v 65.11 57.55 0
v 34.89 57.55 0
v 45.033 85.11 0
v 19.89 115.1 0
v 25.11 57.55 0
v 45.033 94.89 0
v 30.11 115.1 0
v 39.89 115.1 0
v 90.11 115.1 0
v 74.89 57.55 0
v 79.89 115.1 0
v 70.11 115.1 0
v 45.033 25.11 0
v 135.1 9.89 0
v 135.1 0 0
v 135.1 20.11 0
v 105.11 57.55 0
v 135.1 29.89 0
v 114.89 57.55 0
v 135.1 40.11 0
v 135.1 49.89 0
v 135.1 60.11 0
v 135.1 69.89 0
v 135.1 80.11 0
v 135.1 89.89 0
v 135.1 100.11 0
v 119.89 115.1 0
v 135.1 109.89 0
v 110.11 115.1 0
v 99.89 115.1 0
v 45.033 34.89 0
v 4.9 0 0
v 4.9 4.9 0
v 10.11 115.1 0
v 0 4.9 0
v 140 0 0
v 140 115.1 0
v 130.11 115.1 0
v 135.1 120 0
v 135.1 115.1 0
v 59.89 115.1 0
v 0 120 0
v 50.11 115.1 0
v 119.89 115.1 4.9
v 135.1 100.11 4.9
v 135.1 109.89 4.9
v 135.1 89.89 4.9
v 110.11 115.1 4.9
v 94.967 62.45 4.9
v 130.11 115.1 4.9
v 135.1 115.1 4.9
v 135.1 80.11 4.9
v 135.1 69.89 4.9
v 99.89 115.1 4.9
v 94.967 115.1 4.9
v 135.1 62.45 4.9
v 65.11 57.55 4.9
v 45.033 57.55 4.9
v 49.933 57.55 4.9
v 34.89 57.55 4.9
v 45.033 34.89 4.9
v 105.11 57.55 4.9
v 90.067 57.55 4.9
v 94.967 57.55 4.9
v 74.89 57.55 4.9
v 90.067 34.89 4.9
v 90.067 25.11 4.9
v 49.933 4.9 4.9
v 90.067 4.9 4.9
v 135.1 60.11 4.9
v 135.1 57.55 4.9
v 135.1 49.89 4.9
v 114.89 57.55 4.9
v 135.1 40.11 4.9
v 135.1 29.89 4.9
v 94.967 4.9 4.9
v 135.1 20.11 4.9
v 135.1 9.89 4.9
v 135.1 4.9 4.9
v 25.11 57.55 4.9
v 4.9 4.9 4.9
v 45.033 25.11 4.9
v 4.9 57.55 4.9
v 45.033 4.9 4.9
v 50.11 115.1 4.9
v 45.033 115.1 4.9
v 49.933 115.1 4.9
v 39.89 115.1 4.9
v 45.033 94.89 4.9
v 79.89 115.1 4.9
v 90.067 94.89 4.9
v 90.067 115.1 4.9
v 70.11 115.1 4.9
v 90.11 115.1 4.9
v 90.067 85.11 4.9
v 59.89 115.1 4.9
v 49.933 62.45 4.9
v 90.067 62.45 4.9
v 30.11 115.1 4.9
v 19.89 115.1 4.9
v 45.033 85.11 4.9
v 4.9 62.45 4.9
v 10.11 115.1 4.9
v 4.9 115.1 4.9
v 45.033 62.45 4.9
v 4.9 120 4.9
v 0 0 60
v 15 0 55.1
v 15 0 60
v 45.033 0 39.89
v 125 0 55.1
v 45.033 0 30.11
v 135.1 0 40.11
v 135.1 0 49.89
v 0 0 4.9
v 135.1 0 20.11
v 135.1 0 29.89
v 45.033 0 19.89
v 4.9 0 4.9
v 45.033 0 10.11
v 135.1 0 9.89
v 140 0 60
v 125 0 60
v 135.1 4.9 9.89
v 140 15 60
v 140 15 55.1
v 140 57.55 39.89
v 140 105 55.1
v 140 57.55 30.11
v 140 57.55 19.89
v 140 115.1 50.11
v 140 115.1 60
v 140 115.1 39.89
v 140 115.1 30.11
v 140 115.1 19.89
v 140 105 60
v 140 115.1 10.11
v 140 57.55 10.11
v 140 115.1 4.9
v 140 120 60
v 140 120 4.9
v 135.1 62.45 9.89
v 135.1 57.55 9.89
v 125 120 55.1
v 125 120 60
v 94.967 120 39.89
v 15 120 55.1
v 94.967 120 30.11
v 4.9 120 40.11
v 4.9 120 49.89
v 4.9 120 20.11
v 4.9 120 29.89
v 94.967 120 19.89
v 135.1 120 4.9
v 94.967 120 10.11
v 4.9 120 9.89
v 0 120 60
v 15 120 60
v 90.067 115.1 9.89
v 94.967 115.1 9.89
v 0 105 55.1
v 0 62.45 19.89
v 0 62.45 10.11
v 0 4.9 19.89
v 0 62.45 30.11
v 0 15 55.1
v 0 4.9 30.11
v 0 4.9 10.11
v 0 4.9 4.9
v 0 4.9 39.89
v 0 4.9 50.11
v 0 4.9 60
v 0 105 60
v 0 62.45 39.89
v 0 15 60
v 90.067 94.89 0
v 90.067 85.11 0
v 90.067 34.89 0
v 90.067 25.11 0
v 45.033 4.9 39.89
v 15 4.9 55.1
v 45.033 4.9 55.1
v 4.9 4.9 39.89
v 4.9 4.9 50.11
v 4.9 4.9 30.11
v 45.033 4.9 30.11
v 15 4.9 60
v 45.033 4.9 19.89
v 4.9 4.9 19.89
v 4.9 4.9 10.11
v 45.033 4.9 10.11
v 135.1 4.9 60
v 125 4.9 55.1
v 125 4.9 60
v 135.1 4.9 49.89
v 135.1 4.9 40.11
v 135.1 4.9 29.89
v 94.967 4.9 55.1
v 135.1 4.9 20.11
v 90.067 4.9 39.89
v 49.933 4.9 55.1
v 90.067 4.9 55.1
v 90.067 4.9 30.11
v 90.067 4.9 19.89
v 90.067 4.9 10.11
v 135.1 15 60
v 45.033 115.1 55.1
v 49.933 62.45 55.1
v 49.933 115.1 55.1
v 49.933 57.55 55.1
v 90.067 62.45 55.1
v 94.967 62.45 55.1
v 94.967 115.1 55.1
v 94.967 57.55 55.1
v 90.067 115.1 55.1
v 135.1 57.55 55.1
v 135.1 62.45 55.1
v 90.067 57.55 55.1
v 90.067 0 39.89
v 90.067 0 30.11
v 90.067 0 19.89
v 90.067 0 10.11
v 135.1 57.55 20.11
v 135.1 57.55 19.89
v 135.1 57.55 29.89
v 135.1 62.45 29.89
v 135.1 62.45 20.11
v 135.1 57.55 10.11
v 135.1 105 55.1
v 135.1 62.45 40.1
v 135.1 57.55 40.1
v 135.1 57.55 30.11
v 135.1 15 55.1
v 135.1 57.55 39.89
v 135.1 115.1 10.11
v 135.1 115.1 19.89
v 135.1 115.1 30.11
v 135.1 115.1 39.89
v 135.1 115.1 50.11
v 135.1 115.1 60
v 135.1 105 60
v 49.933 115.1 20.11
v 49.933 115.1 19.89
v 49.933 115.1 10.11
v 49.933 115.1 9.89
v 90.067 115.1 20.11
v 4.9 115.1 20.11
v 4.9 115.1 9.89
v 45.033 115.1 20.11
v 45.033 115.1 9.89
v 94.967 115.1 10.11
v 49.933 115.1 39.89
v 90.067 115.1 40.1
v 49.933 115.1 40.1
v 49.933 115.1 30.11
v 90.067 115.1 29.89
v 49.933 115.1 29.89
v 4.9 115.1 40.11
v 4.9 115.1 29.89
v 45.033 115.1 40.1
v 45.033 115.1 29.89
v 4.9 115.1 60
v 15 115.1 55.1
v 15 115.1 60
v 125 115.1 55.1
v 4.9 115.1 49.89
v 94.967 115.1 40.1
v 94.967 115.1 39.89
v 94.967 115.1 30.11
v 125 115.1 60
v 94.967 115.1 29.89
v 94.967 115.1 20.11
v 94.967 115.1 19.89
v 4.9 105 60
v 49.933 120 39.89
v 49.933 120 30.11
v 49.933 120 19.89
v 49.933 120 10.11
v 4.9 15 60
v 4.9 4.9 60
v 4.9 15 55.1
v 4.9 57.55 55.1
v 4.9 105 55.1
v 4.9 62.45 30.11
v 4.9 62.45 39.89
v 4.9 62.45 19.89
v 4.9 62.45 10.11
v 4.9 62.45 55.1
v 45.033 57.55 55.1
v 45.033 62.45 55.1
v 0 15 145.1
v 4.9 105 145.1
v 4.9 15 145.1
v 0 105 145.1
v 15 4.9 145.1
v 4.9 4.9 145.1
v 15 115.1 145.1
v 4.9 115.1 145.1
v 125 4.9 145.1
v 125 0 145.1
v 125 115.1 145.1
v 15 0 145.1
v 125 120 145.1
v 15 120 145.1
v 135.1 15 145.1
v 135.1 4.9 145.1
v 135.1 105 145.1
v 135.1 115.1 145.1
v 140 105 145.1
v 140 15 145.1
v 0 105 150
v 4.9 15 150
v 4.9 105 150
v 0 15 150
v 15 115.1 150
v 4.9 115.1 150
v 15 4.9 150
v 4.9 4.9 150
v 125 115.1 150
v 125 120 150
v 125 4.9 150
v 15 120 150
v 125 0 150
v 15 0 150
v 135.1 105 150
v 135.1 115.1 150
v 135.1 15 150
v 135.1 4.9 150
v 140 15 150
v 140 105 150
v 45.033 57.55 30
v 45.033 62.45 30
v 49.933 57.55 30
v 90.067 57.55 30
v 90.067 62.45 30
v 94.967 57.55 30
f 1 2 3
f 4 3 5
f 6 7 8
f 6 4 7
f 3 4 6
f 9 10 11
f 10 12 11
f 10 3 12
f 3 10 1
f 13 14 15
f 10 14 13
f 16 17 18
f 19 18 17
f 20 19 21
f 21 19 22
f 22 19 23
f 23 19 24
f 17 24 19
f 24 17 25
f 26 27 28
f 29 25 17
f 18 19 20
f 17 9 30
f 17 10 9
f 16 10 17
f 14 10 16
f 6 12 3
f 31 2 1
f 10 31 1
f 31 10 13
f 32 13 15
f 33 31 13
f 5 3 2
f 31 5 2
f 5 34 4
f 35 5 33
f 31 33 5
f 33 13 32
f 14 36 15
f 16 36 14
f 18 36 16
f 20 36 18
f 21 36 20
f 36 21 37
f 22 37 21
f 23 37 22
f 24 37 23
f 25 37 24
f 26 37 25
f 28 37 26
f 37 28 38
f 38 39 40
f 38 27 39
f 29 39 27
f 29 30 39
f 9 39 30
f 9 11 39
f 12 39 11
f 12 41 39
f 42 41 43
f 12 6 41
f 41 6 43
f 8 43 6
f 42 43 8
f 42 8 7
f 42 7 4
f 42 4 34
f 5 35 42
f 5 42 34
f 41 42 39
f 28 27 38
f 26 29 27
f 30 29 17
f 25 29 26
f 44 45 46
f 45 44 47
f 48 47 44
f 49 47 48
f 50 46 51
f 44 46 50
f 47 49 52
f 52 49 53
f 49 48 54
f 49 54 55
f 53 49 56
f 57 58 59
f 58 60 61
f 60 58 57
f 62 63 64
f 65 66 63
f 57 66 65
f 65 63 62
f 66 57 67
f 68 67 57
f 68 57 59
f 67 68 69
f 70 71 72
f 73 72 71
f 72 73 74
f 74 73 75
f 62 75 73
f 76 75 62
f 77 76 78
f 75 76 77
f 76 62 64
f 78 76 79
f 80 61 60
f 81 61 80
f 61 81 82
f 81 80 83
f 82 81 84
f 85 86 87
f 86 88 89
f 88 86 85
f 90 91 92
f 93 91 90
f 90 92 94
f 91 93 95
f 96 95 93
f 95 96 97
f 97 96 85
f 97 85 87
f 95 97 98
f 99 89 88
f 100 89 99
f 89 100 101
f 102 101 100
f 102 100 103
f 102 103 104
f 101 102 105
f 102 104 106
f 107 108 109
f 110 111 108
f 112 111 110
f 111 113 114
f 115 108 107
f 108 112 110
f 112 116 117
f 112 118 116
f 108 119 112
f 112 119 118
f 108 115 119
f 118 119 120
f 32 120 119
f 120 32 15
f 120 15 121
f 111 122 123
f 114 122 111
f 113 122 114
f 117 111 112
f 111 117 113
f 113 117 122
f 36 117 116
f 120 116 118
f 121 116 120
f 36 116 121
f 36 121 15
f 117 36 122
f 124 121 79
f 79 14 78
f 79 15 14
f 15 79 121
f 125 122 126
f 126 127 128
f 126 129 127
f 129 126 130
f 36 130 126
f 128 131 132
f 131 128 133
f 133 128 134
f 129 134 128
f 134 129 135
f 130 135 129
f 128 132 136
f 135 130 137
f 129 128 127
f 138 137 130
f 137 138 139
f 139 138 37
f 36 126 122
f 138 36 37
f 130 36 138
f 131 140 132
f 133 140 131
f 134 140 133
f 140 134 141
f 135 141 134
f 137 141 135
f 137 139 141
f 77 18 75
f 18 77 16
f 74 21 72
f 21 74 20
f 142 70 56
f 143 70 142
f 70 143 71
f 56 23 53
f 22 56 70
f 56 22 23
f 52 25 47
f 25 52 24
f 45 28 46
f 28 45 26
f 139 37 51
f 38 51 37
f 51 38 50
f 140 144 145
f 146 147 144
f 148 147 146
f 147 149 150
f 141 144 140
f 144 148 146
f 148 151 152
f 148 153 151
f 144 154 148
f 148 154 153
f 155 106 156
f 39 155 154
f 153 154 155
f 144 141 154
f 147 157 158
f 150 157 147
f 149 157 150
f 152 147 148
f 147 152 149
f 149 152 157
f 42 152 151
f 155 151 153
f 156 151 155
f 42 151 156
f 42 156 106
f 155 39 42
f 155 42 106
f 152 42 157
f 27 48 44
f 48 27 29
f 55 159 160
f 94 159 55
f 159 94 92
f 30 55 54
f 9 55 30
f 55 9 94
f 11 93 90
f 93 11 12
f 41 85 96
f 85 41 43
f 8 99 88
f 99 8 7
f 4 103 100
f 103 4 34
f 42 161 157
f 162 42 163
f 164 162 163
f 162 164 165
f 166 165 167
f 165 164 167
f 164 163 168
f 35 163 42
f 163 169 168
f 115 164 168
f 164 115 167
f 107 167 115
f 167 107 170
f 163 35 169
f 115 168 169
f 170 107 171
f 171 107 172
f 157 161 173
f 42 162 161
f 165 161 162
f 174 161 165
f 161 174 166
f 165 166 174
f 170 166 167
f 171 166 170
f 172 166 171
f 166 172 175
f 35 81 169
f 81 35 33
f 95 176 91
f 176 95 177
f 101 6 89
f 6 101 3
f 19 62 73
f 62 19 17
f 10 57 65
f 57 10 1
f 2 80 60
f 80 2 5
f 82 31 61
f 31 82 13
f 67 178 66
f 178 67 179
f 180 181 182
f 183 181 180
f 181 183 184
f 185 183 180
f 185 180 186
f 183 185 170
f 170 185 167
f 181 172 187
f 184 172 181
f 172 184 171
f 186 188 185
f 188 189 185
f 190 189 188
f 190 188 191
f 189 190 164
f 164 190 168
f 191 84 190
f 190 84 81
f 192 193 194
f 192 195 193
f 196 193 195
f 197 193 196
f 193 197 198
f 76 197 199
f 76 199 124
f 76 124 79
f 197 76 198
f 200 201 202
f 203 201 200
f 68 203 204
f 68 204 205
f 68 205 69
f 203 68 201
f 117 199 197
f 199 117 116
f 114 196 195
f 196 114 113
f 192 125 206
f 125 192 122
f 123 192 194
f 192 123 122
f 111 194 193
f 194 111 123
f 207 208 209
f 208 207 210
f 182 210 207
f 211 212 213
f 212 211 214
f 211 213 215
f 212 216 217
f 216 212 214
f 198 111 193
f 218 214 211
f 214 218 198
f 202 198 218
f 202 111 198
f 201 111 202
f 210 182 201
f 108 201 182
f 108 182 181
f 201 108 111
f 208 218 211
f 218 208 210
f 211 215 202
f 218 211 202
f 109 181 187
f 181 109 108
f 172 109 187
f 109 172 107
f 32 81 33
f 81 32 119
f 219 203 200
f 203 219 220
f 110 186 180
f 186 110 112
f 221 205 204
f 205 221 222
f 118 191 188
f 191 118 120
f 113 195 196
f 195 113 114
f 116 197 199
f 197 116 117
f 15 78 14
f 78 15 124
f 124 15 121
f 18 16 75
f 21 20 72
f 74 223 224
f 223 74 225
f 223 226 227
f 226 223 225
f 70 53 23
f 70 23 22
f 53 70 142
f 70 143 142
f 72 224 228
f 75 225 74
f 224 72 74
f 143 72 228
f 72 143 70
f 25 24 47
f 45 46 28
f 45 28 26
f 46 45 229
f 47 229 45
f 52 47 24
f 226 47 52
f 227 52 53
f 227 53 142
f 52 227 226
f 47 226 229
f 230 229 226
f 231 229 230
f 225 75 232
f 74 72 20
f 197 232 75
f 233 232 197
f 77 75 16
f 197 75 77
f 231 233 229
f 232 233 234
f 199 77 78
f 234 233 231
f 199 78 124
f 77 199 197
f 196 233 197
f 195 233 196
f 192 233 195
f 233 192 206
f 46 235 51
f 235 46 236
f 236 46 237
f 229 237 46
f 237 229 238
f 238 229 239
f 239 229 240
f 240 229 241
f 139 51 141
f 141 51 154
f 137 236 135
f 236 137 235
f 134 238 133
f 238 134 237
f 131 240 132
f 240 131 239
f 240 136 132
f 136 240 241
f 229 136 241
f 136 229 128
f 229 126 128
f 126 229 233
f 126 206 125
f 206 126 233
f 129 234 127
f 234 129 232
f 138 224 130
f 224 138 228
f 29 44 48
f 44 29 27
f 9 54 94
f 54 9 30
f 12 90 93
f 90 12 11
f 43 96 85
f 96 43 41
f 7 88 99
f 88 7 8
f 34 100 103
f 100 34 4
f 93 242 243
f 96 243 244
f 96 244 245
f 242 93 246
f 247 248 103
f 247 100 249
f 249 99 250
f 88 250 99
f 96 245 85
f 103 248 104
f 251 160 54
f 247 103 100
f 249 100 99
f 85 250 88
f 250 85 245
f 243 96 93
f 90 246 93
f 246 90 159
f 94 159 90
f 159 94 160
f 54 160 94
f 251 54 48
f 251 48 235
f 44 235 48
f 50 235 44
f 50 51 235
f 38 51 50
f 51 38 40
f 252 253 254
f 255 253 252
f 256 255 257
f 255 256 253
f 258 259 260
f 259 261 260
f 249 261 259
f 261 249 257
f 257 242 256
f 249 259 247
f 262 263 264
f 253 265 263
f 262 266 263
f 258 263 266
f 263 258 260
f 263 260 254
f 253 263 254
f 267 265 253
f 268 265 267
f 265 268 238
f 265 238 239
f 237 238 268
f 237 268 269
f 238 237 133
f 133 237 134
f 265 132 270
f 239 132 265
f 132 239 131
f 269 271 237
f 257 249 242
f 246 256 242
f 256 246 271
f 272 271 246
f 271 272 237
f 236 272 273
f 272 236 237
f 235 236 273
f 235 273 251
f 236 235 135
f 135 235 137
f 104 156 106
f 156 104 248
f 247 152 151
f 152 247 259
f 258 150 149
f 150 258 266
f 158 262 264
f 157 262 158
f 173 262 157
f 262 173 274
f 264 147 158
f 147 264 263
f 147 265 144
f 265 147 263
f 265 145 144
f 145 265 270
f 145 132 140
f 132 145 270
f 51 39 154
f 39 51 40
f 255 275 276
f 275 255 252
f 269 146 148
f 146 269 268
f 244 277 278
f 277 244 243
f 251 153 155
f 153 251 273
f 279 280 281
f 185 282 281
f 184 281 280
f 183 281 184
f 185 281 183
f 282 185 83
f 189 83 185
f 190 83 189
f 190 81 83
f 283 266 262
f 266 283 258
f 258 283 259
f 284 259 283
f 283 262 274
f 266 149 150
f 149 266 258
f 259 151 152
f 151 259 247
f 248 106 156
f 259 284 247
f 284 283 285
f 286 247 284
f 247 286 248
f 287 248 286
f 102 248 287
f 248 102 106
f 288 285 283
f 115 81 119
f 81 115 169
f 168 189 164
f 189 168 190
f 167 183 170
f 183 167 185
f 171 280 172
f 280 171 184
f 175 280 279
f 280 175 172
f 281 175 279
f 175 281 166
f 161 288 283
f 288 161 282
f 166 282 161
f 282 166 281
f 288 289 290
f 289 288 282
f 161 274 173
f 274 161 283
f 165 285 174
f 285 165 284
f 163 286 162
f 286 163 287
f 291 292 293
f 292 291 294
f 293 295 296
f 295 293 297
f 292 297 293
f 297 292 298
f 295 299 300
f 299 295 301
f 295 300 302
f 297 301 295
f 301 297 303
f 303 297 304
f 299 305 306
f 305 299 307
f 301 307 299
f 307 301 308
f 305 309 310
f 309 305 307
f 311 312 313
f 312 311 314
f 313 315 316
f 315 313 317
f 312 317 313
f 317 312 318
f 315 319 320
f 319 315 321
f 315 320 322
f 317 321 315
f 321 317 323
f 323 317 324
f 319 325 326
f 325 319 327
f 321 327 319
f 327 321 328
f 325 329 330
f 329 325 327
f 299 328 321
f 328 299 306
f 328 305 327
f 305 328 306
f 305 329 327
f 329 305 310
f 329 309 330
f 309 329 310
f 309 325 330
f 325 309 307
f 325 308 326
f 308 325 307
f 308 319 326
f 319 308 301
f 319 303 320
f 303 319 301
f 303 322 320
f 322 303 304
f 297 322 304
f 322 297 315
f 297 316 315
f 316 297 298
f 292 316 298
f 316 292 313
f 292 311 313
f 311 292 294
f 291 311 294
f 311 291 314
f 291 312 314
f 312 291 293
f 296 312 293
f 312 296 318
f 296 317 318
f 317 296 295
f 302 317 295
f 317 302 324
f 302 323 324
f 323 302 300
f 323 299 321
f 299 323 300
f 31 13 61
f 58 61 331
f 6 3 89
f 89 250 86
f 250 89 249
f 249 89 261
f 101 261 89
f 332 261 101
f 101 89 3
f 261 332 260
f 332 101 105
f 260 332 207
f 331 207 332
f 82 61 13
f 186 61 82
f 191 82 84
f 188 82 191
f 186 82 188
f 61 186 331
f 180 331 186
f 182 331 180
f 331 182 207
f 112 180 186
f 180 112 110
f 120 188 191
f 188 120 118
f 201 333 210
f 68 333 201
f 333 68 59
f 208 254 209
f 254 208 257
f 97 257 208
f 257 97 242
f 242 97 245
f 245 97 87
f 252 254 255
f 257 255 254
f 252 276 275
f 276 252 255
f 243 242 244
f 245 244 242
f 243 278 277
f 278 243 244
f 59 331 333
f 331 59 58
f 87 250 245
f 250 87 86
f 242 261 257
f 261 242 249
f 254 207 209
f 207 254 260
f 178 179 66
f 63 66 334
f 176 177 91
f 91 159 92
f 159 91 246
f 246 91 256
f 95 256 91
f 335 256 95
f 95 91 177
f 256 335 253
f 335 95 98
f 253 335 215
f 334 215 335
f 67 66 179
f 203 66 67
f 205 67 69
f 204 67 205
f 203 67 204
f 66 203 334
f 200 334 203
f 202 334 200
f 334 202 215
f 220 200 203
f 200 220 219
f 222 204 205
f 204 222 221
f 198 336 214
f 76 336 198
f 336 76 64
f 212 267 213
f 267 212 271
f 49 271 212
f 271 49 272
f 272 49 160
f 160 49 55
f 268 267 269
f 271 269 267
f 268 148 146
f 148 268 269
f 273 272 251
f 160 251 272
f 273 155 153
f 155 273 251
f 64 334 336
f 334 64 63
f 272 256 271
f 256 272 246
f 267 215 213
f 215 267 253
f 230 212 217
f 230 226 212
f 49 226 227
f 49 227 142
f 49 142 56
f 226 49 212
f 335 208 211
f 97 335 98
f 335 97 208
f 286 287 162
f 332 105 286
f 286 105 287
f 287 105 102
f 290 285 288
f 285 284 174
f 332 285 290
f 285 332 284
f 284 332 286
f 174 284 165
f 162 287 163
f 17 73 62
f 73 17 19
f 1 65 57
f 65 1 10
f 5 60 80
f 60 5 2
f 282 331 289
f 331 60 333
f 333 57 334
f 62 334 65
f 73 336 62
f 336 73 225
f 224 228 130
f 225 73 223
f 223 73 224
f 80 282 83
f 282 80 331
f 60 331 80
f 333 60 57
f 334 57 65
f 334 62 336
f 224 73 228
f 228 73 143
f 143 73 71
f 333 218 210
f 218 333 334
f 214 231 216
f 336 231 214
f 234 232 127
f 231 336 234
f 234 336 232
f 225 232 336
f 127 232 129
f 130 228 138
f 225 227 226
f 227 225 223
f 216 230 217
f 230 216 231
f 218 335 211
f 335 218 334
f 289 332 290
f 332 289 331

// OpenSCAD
union() {
	union() {
		linear_extrude(height = 4.9000000000) {
			union() {
				difference() {
					polygon(points = [[140.0000000000, 89.8900000000], [135.1000000000, 89.8900000000], [135.1000000000, 80.1100000000], [140.0000000000, 80.1100000000], [140.0000000000, 69.8900000000], [135.1000000000, 69.8900000000], [135.1000000000, 60.1100000000], [140.0000000000, 60.1100000000], [140.0000000000, 49.8900000000], [135.1000000000, 49.8900000000], [135.1000000000, 40.1100000000], [140.0000000000, 40.1100000000], [140.0000000000, 29.8900000000], [135.1000000000, 29.8900000000], [135.1000000000, 20.1100000000], [140.0000000000, 20.1100000000], [140.0000000000, 9.8900000000], [135.1000000000, 9.8900000000], [135.1000000000, 0.0000000000], [129.8900000000, 0.0000000000], [129.8900000000, 4.9000000000], [120.1100000000, 4.9000000000], [120.1100000000, 0.0000000000], [109.8900000000, 0.0000000000], [109.8900000000, 4.9000000000], [100.1100000000, 4.9000000000], [100.1100000000, 0.0000000000], [89.8900000000, 0.0000000000], [89.8900000000, 4.9000000000], [80.1100000000, 4.9000000000], [80.1100000000, 0.0000000000], [69.8900000000, 0.0000000000], [69.8900000000, 4.9000000000], [60.1100000000, 4.9000000000], [60.1100000000, 0.0000000000], [49.8900000000, 0.0000000000], [49.8900000000, 4.9000000000], [40.1100000000, 4.9000000000], [40.1100000000, 0.0000000000], [29.8900000000, 0.0000000000], [29.8900000000, 4.9000000000], [20.1100000000, 4.9000000000], [20.1100000000, 0.0000000000], [9.8900000000, 0.0000000000], [9.8900000000, 4.9000000000], [0.0000000000, 4.9000000000], [0.0000000000, 10.1100000000], [4.9000000000, 10.1100000000], [4.9000000000, 19.8900000000], [0.0000000000, 19.8900000000], [0.0000000000, 30.1100000000], [4.9000000000, 30.1100000000], [4.9000000000, 39.8900000000], [0.0000000000, 39.8900000000], [0.0000000000, 50.1100000000], [4.9000000000, 50.1100000000], [4.9000000000, 59.8900000000], [0.0000000000, 59.8900000000], [0.0000000000, 70.1100000000], [4.9000000000, 70.1100000000], [4.9000000000, 79.8900000000], [0.0000000000, 79.8900000000], [0.0000000000, 90.1100000000], [4.9000000000, 90.1100000000], [4.9000000000, 99.8900000000], [0.0000000000, 99.8900000000], [0.0000000000, 110.1100000000], [4.9000000000, 110.1100000000], [4.9000000000, 120.0000000000], [10.1100000000, 120.0000000000], [10.1100000000, 115.1000000000], [19.8900000000, 115.1000000000], [19.8900000000, 120.0000000000], [30.1100000000, 120.0000000000], [30.1100000000, 115.1000000000], [39.8900000000, 115.1000000000], [39.8900000000, 120.0000000000], [50.1100000000, 120.0000000000], [50.1100000000, 115.1000000000], [59.8900000000, 115.1000000000], [59.8900000000, 120.0000000000], [70.1100000000, 120.0000000000], [70.1100000000, 115.1000000000], [79.8900000000, 115.1000000000], [79.8900000000, 120.0000000000], [90.1100000000, 120.0000000000], [90.1100000000, 115.1000000000], [99.8900000000, 115.1000000000], [99.8900000000, 120.0000000000], [110.1100000000, 120.0000000000], [110.1100000000, 115.1000000000], [119.8900000000, 115.1000000000], [119.8900000000, 120.0000000000], [130.1100000000, 120.0000000000], [130.1100000000, 115.1000000000], [140.0000000000, 115.1000000000], [140.0000000000, 109.8900000000], [135.1000000000, 109.8900000000], [135.1000000000, 100.1100000000], [140.0000000000, 100.1100000000], [140.0000000000, 89.8900000000]]);
					polygon(points = [[45.0333333333, 25.1100000000], [49.9333333333, 25.1100000000], [49.9333333333, 34.8900000000], [45.0333333333, 34.8900000000], [45.0333333333, 25.1100000000]]);
					polygon(points = [[45.0333333333, 85.1100000000], [49.9333333333, 85.1100000000], [49.9333333333, 94.8900000000], [45.0333333333, 94.8900000000], [45.0333333333, 85.1100000000]]);
					polygon(points = [[90.0666666667, 34.8900000000], [90.0666666667, 25.1100000000], [94.9666666667, 25.1100000000], [94.9666666667, 34.8900000000], [90.0666666667, 34.8900000000]]);
					polygon(points = [[90.0666666667, 94.8900000000], [90.0666666667, 85.1100000000], [94.9666666667, 85.1100000000], [94.9666666667, 94.8900000000], [90.0666666667, 94.8900000000]]);
					polygon(points = [[34.8900000000, 57.5500000000], [34.8900000000, 62.4500000000], [25.1100000000, 62.4500000000], [25.1100000000, 57.5500000000], [34.8900000000, 57.5500000000]]);
					polygon(points = [[65.1100000000, 57.5500000000], [74.8900000000, 57.5500000000], [74.8900000000, 62.4500000000], [65.1100000000, 62.4500000000], [65.1100000000, 57.5500000000]]);
					polygon(points = [[105.1100000000, 57.5500000000], [114.8900000000, 57.5500000000], [114.8900000000, 62.4500000000], [105.1100000000, 62.4500000000], [105.1100000000, 57.5500000000]]);
				}
			}
		}
	}
	union() {
		color(alpha = 1.0000000000, c = [0.8000000000, 0.5000000000, 0.2000000000]) {
			translate(v = [0, 4.9000000000, 0]) {
				rotate(a = 90, v = [1, 0, 0]) {
					linear_extrude(height = 4.9000000000) {
						union() {
							difference() {
								polygon(points = [[135.1000000000, 40.1100000000], [140.0000000000, 40.1100000000], [140.0000000000, 29.8900000000], [135.1000000000, 29.8900000000], [135.1000000000, 20.1100000000], [140.0000000000, 20.1100000000], [140.0000000000, 9.8900000000], [135.1000000000, 9.8900000000], [135.1000000000, 4.9000000000], [130.1100000000, 4.9000000000], [130.1100000000, 0.0000000000], [119.8900000000, 0.0000000000], [119.8900000000, 4.9000000000], [110.1100000000, 4.9000000000], [110.1100000000, 0.0000000000], [99.8900000000, 0.0000000000], [99.8900000000, 4.9000000000], [90.1100000000, 4.9000000000], [90.1100000000, 0.0000000000], [79.8900000000, 0.0000000000], [79.8900000000, 4.9000000000], [70.1100000000, 4.9000000000], [70.1100000000, 0.0000000000], [59.8900000000, 0.0000000000], [59.8900000000, 4.9000000000], [50.1100000000, 4.9000000000], [50.1100000000, 0.0000000000], [39.8900000000, 0.0000000000], [39.8900000000, 4.9000000000], [30.1100000000, 4.9000000000], [30.1100000000, 0.0000000000], [19.8900000000, 0.0000000000], [19.8900000000, 4.9000000000], [10.1100000000, 4.9000000000], [10.1100000000, 0.0000000000], [4.9000000000, 0.0000000000], [4.9000000000, 9.8900000000], [0.0000000000, 9.8900000000], [0.0000000000, 20.1100000000], [4.9000000000, 20.1100000000], [4.9000000000, 29.8900000000], [0.0000000000, 29.8900000000], [0.0000000000, 40.1100000000], [4.9000000000, 40.1100000000], [4.9000000000, 49.8900000000], [0.0000000000, 49.8900000000], [0.0000000000, 60.0000000000], [15.0000000000, 60.0000000000], [15.0000000000, 55.1000000000], [125.0000000000, 55.1000000000], [125.0000000000, 60.0000000000], [140.0000000000, 60.0000000000], [140.0000000000, 49.8900000000], [135.1000000000, 49.8900000000], [135.1000000000, 40.1100000000]]);
								polygon(points = [[94.9666666667, 30.1100000000], [94.9666666667, 39.8900000000], [90.0666666667, 39.8900000000], [90.0666666667, 30.1100000000], [94.9666666667, 30.1100000000]]);
								polygon(points = [[94.9666666667, 10.1100000000], [94.9666666667, 19.8900000000], [90.0666666667, 19.8900000000], [90.0666666667, 10.1100000000], [94.9666666667, 10.1100000000]]);
								polygon(points = [[45.0333333333, 30.1100000000], [49.9333333333, 30.1100000000], [49.9333333333, 39.8900000000], [45.0333333333, 39.8900000000], [45.0333333333, 30.1100000000]]);
								polygon(points = [[45.0333333333, 10.1100000000], [49.9333333333, 10.1100000000], [49.9333333333, 19.8900000000], [45.0333333333, 19.8900000000], [45.0333333333, 10.1100000000]]);
							}
						}
					}
				}
			}
		}
	}
	union() {
		color(alpha = 1.0000000000, c = [0.7000000000, 0.4000000000, 0.1000000000]) {
			translate(v = [135.1000000000, 0, 0]) {
				rotate(a = 90, v = [0, 0, 1]) {
					rotate(a = 90, v = [1, 0, 0]) {
						linear_extrude(height = 4.9000000000) {
							union() {
								difference() {
									polygon(points = [[120.0000000000, 50.1100000000], [120.0000000000, 39.8900000000], [115.1000000000, 39.8900000000], [115.1000000000, 30.1100000000], [120.0000000000, 30.1100000000], [120.0000000000, 19.8900000000], [115.1000000000, 19.8900000000], [115.1000000000, 10.1100000000], [120.0000000000, 10.1100000000], [120.0000000000, 4.9000000000], [110.1100000000, 4.9000000000], [110.1100000000, 0.0000000000], [99.8900000000, 0.0000000000], [99.8900000000, 4.9000000000], [90.1100000000, 4.9000000000], [90.1100000000, 0.0000000000], [79.8900000000, 0.0000000000], [79.8900000000, 4.9000000000], [70.1100000000, 4.9000000000], [70.1100000000, 0.0000000000], [59.8900000000, 0.0000000000], [59.8900000000, 4.9000000000], [50.1100000000, 4.9000000000], [50.1100000000, 0.0000000000], [39.8900000000, 0.0000000000], [39.8900000000, 4.9000000000], [30.1100000000, 4.9000000000], [30.1100000000, 0.0000000000], [19.8900000000, 0.0000000000], [19.8900000000, 4.9000000000], [10.1100000000, 4.9000000000], [10.1100000000, 0.0000000000], [0.0000000000, 0.0000000000], [0.0000000000, 10.1100000000], [4.9000000000, 10.1100000000], [4.9000000000, 19.8900000000], [0.0000000000, 19.8900000000], [0.0000000000, 30.1100000000], [4.9000000000, 30.1100000000], [4.9000000000, 39.8900000000], [0.0000000000, 39.8900000000], [0.0000000000, 50.1100000000], [4.9000000000, 50.1100000000], [4.9000000000, 60.0000000000], [15.0000000000, 60.0000000000], [15.0000000000, 55.1000000000], [105.0000000000, 55.1000000000], [105.0000000000, 60.0000000000], [115.1000000000, 60.0000000000], [115.1000000000, 50.1100000000], [120.0000000000, 50.1100000000]]);
									polygon(points = [[57.5500000000, 30.1100000000], [62.4500000000, 30.1100000000], [62.4500000000, 39.8900000000], [57.5500000000, 39.8900000000], [57.5500000000, 30.1100000000]]);
									polygon(points = [[57.5500000000, 10.1100000000], [62.4500000000, 10.1100000000], [62.4500000000, 19.8900000000], [57.5500000000, 19.8900000000], [57.5500000000, 10.1100000000]]);
								}
							}
						}
					}
				}
			}
		}
	}
	union() {
		color(alpha = 1.0000000000, c = [0.8000000000, 0.5000000000, 0.2000000000]) {
			translate(v = [140, 115.1000000000, 0]) {
				rotate(a = 180, v = [0, 0, 1]) {
					rotate(a = 90, v = [1, 0, 0]) {
						linear_extrude(height = 4.9000000000) {
							union() {
								difference() {
									polygon(points = [[135.1000000000, 40.1100000000], [140.0000000000, 40.1100000000], [140.0000000000, 29.8900000000], [135.1000000000, 29.8900000000], [135.1000000000, 20.1100000000], [140.0000000000, 20.1100000000], [140.0000000000, 9.8900000000], [135.1000000000, 9.8900000000], [135.1000000000, 4.9000000000], [130.1100000000, 4.9000000000], [130.1100000000, 0.0000000000], [119.8900000000, 0.0000000000], [119.8900000000, 4.9000000000], [110.1100000000, 4.9000000000], [110.1100000000, 0.0000000000], [99.8900000000, 0.0000000000], [99.8900000000, 4.9000000000], [90.1100000000, 4.9000000000], [90.1100000000, 0.0000000000], [79.8900000000, 0.0000000000], [79.8900000000, 4.9000000000], [70.1100000000, 4.9000000000], [70.1100000000, 0.0000000000], [59.8900000000, 0.0000000000], [59.8900000000, 4.9000000000], [50.1100000000, 4.9000000000], [50.1100000000, 0.0000000000], [39.8900000000, 0.0000000000], [39.8900000000, 4.9000000000], [30.1100000000, 4.9000000000], [30.1100000000, 0.0000000000], [19.8900000000, 0.0000000000], [19.8900000000, 4.9000000000], [10.1100000000, 4.9000000000], [10.1100000000, 0.0000000000], [4.9000000000, 0.0000000000], [4.9000000000, 9.8900000000], [0.0000000000, 9.8900000000], [0.0000000000, 20.1100000000], [4.9000000000, 20.1100000000], [4.9000000000, 29.8900000000], [0.0000000000, 29.8900000000], [0.0000000000, 40.1100000000], [4.9000000000, 40.1100000000], [4.9000000000, 49.8900000000], [0.0000000000, 49.8900000000], [0.0000000000, 60.0000000000], [15.0000000000, 60.0000000000], [15.0000000000, 55.1000000000], [125.0000000000, 55.1000000000], [125.0000000000, 60.0000000000], [140.0000000000, 60.0000000000], [140.0000000000, 49.8900000000], [135.1000000000, 49.8900000000], [135.1000000000, 40.1100000000]]);
									polygon(points = [[94.9666666667, 30.1100000000], [94.9666666667, 39.8900000000], [90.0666666667, 39.8900000000], [90.0666666667, 30.1100000000], [94.9666666667, 30.1100000000]]);
									polygon(points = [[94.9666666667, 10.1100000000], [94.9666666667, 19.8900000000], [90.0666666667, 19.8900000000], [90.0666666667, 10.1100000000], [94.9666666667, 10.1100000000]]);
									polygon(points = [[45.0333333333, 30.1100000000], [49.9333333333, 30.1100000000], [49.9333333333, 39.8900000000], [45.0333333333, 39.8900000000], [45.0333333333, 30.1100000000]]);
									polygon(points = [[45.0333333333, 10.1100000000], [49.9333333333, 10.1100000000], [49.9333333333, 19.8900000000], [45.0333333333, 19.8900000000], [45.0333333333, 10.1100000000]]);
								}
							}
						}
					}
				}
			}
		}
	}
	union() {
		color(alpha = 1.0000000000, c = [0.7000000000, 0.4000000000, 0.1000000000]) {
			translate(v = [4.9000000000, 120, 0]) {
				rotate(a = 270, v = [0, 0, 1]) {
					rotate(a = 90, v = [1, 0, 0]) {
						linear_extrude(height = 4.9000000000) {
							union() {
								difference() {
									polygon(points = [[120.0000000000, 50.1100000000], [120.0000000000, 39.8900000000], [115.1000000000, 39.8900000000], [115.1000000000, 30.1100000000], [120.0000000000, 30.1100000000], [120.0000000000, 19.8900000000], [115.1000000000, 19.8900000000], [115.1000000000, 10.1100000000], [120.0000000000, 10.1100000000], [120.0000000000, 4.9000000000], [110.1100000000, 4.9000000000], [110.1100000000, 0.0000000000], [99.8900000000, 0.0000000000], [99.8900000000, 4.9000000000], [90.1100000000, 4.9000000000], [90.1100000000, 0.0000000000], [79.8900000000, 0.0000000000], [79.8900000000, 4.9000000000], [70.1100000000, 4.9000000000], [70.1100000000, 0.0000000000], [59.8900000000, 0.0000000000], [59.8900000000, 4.9000000000], [50.1100000000, 4.9000000000], [50.1100000000, 0.0000000000], [39.8900000000, 0.0000000000], [39.8900000000, 4.9000000000], [30.1100000000, 4.9000000000], [30.1100000000, 0.0000000000], [19.8900000000, 0.0000000000], [19.8900000000, 4.9000000000], [10.1100000000, 4.9000000000], [10.1100000000, 0.0000000000], [0.0000000000, 0.0000000000], [0.0000000000, 10.1100000000], [4.9000000000, 10.1100000000], [4.9000000000, 19.8900000000], [0.0000000000, 19.8900000000], [0.0000000000, 30.1100000000], [4.9000000000, 30.1100000000], [4.9000000000, 39.8900000000], [0.0000000000, 39.8900000000], [0.0000000000, 50.1100000000], [4.9000000000, 50.1100000000], [4.9000000000, 60.0000000000], [15.0000000000, 60.0000000000], [15.0000000000, 55.1000000000], [105.0000000000, 55.1000000000], [105.0000000000, 60.0000000000], [115.1000000000, 60.0000000000], [115.1000000000, 50.1100000000], [120.0000000000, 50.1100000000]]);
									polygon(points = [[57.5500000000, 30.1100000000], [62.4500000000, 30.1100000000], [62.4500000000, 39.8900000000], [57.5500000000, 39.8900000000], [57.5500000000, 30.1100000000]]);
									polygon(points = [[57.5500000000, 10.1100000000], [62.4500000000, 10.1100000000], [62.4500000000, 19.8900000000], [57.5500000000, 19.8900000000], [57.5500000000, 10.1100000000]]);
								}
							}
						}
					}
				}
			}
		}
	}
	union() {
		translate(v = [0, 0, 145.1000000000]) {
			linear_extrude(height = 4.9000000000) {
				union() {
					difference() {
						polygon(points = [[135.1000000000, 4.9000000000], [125.0000000000, 4.9000000000], [125.0000000000, 0.0000000000], [15.0000000000, 0.0000000000], [15.0000000000, 4.9000000000], [4.9000000000, 4.9000000000], [4.9000000000, 15.0000000000], [0.0000000000, 15.0000000000], [0.0000000000, 105.0000000000], [4.9000000000, 105.0000000000], [4.9000000000, 115.1000000000], [15.0000000000, 115.1000000000], [15.0000000000, 120.0000000000], [125.0000000000, 120.0000000000], [125.0000000000, 115.1000000000], [135.1000000000, 115.1000000000], [135.1000000000, 105.0000000000], [140.0000000000, 105.0000000000], [140.0000000000, 15.0000000000], [135.1000000000, 15.0000000000], [135.1000000000, 4.9000000000]]);
					}
				}
			}
		}
	}
	union() {
		color(alpha = 1.0000000000, c = [0.7000000000, 0.4000000000, 0.1000000000]) {
			translate(v = [45.0333333333, 0, 0]) {
				rotate(a = 90, v = [0, 0, 1]) {
					rotate(a = 90, v = [1, 0, 0]) {
						linear_extrude(height = 4.9000000000) {
							union() {
								difference() {
									polygon(points = [[120.0000000000, 40.1000000000], [120.0000000000, 29.8900000000], [115.1000000000, 29.8900000000], [115.1000000000, 20.1100000000], [120.0000000000, 20.1100000000], [120.0000000000, 9.8900000000], [115.1000000000, 9.8900000000], [115.1000000000, 4.9000000000], [95.1100000000, 4.9000000000], [95.1100000000, 0.0000000000], [84.8900000000, 0.0000000000], [84.8900000000, 4.9000000000], [62.4500000000, 4.9000000000], [62.4500000000, 30.0000000000], [57.5500000000, 30.0000000000], [57.5500000000, 4.9000000000], [35.1100000000, 4.9000000000], [35.1100000000, 0.0000000000], [24.8900000000, 0.0000000000], [24.8900000000, 4.9000000000], [4.9000000000, 4.9000000000], [4.9000000000, 9.8900000000], [0.0000000000, 9.8900000000], [0.0000000000, 20.1100000000], [4.9000000000, 20.1100000000], [4.9000000000, 29.8900000000], [0.0000000000, 29.8900000000], [0.0000000000, 40.1000000000], [4.9000000000, 40.1000000000], [4.9000000000, 40.1100000000], [4.9000000000, 49.8900000000], [4.9000000000, 55.1000000000], [115.1000000000, 55.1000000000], [115.1000000000, 49.8900000000], [115.1000000000, 40.1100000000], [115.1000000000, 40.1000000000], [120.0000000000, 40.1000000000]]);
								}
							}
						}
					}
				}
			}
		}
	}
	union() {
		color(alpha = 1.0000000000, c = [0.7000000000, 0.4000000000, 0.1000000000]) {
			translate(v = [90.0666666667, 0, 0]) {
				rotate(a = 90, v = [0, 0, 1]) {
					rotate(a = 90, v = [1, 0, 0]) {
						linear_extrude(height = 4.9000000000) {
							union() {
								difference() {
									polygon(points = [[120.0000000000, 40.1000000000], [120.0000000000, 29.8900000000], [115.1000000000, 29.8900000000], [115.1000000000, 20.1100000000], [120.0000000000, 20.1100000000], [120.0000000000, 9.8900000000], [115.1000000000, 9.8900000000], [115.1000000000, 4.9000000000], [95.1100000000, 4.9000000000], [95.1100000000, 0.0000000000], [84.8900000000, 0.0000000000], [84.8900000000, 4.9000000000], [62.4500000000, 4.9000000000], [62.4500000000, 30.0000000000], [57.5500000000, 30.0000000000], [57.5500000000, 4.9000000000], [35.1100000000, 4.9000000000], [35.1100000000, 0.0000000000], [24.8900000000, 0.0000000000], [24.8900000000, 4.9000000000], [4.9000000000, 4.9000000000], [4.9000000000, 9.8900000000], [0.0000000000, 9.8900000000], [0.0000000000, 20.1100000000], [4.9000000000, 20.1100000000], [4.9000000000, 29.8900000000], [0.0000000000, 29.8900000000], [0.0000000000, 40.1000000000], [4.9000000000, 40.1000000000], [4.9000000000, 40.1100000000], [4.9000000000, 49.8900000000], [4.9000000000, 55.1000000000], [115.1000000000, 55.1000000000], [115.1000000000, 49.8900000000], [115.1000000000, 40.1100000000], [115.1000000000, 40.1000000000], [120.0000000000, 40.1000000000]]);
								}
							}
						}
					}
				}
			}
		}
	}
	union() {
		color(alpha = 1.0000000000, c = [0.8000000000, 0.5000000000, 0.2000000000]) {
			translate(v = [0, 62.4500000000, 0]) {
				rotate(a = 90, v = [1, 0, 0]) {
					linear_extrude(height = 4.9000000000) {
						union() {
							difference() {
								polygon(points = [[140.0000000000, 29.8900000000], [135.1000000000, 29.8900000000], [135.1000000000, 20.1100000000], [140.0000000000, 20.1100000000], [140.0000000000, 9.8900000000], [135.1000000000, 9.8900000000], [135.1000000000, 4.9000000000], [115.1100000000, 4.9000000000], [115.1100000000, 0.0000000000], [104.8900000000, 0.0000000000], [104.8900000000, 4.9000000000], [75.1100000000, 4.9000000000], [75.1100000000, 0.0000000000], [64.8900000000, 0.0000000000], [64.8900000000, 4.9000000000], [35.1100000000, 4.9000000000], [35.1100000000, 0.0000000000], [24.8900000000, 0.0000000000], [24.8900000000, 4.9000000000], [4.9000000000, 4.9000000000], [4.9000000000, 9.8900000000], [0.0000000000, 9.8900000000], [0.0000000000, 20.1100000000], [4.9000000000, 20.1100000000], [4.9000000000, 29.8900000000], [0.0000000000, 29.8900000000], [0.0000000000, 40.1000000000], [4.9000000000, 40.1000000000], [4.9000000000, 40.1100000000], [4.9000000000, 49.8900000000], [4.9000000000, 55.1000000000], [45.0333333333, 55.1000000000], [45.0333333333, 30.0000000000], [49.9333333333, 30.0000000000], [49.9333333333, 55.1000000000], [90.0666666667, 55.1000000000], [90.0666666667, 30.0000000000], [94.9666666667, 30.0000000000], [94.9666666667, 55.1000000000], [135.1000000000, 55.1000000000], [135.1000000000, 49.8900000000], [135.1000000000, 40.1100000000], [135.1000000000, 40.1000000000], [140.0000000000, 40.1000000000], [140.0000000000, 29.8900000000]]);
							}
						}
					}
				}
			}
		}
	}
}
